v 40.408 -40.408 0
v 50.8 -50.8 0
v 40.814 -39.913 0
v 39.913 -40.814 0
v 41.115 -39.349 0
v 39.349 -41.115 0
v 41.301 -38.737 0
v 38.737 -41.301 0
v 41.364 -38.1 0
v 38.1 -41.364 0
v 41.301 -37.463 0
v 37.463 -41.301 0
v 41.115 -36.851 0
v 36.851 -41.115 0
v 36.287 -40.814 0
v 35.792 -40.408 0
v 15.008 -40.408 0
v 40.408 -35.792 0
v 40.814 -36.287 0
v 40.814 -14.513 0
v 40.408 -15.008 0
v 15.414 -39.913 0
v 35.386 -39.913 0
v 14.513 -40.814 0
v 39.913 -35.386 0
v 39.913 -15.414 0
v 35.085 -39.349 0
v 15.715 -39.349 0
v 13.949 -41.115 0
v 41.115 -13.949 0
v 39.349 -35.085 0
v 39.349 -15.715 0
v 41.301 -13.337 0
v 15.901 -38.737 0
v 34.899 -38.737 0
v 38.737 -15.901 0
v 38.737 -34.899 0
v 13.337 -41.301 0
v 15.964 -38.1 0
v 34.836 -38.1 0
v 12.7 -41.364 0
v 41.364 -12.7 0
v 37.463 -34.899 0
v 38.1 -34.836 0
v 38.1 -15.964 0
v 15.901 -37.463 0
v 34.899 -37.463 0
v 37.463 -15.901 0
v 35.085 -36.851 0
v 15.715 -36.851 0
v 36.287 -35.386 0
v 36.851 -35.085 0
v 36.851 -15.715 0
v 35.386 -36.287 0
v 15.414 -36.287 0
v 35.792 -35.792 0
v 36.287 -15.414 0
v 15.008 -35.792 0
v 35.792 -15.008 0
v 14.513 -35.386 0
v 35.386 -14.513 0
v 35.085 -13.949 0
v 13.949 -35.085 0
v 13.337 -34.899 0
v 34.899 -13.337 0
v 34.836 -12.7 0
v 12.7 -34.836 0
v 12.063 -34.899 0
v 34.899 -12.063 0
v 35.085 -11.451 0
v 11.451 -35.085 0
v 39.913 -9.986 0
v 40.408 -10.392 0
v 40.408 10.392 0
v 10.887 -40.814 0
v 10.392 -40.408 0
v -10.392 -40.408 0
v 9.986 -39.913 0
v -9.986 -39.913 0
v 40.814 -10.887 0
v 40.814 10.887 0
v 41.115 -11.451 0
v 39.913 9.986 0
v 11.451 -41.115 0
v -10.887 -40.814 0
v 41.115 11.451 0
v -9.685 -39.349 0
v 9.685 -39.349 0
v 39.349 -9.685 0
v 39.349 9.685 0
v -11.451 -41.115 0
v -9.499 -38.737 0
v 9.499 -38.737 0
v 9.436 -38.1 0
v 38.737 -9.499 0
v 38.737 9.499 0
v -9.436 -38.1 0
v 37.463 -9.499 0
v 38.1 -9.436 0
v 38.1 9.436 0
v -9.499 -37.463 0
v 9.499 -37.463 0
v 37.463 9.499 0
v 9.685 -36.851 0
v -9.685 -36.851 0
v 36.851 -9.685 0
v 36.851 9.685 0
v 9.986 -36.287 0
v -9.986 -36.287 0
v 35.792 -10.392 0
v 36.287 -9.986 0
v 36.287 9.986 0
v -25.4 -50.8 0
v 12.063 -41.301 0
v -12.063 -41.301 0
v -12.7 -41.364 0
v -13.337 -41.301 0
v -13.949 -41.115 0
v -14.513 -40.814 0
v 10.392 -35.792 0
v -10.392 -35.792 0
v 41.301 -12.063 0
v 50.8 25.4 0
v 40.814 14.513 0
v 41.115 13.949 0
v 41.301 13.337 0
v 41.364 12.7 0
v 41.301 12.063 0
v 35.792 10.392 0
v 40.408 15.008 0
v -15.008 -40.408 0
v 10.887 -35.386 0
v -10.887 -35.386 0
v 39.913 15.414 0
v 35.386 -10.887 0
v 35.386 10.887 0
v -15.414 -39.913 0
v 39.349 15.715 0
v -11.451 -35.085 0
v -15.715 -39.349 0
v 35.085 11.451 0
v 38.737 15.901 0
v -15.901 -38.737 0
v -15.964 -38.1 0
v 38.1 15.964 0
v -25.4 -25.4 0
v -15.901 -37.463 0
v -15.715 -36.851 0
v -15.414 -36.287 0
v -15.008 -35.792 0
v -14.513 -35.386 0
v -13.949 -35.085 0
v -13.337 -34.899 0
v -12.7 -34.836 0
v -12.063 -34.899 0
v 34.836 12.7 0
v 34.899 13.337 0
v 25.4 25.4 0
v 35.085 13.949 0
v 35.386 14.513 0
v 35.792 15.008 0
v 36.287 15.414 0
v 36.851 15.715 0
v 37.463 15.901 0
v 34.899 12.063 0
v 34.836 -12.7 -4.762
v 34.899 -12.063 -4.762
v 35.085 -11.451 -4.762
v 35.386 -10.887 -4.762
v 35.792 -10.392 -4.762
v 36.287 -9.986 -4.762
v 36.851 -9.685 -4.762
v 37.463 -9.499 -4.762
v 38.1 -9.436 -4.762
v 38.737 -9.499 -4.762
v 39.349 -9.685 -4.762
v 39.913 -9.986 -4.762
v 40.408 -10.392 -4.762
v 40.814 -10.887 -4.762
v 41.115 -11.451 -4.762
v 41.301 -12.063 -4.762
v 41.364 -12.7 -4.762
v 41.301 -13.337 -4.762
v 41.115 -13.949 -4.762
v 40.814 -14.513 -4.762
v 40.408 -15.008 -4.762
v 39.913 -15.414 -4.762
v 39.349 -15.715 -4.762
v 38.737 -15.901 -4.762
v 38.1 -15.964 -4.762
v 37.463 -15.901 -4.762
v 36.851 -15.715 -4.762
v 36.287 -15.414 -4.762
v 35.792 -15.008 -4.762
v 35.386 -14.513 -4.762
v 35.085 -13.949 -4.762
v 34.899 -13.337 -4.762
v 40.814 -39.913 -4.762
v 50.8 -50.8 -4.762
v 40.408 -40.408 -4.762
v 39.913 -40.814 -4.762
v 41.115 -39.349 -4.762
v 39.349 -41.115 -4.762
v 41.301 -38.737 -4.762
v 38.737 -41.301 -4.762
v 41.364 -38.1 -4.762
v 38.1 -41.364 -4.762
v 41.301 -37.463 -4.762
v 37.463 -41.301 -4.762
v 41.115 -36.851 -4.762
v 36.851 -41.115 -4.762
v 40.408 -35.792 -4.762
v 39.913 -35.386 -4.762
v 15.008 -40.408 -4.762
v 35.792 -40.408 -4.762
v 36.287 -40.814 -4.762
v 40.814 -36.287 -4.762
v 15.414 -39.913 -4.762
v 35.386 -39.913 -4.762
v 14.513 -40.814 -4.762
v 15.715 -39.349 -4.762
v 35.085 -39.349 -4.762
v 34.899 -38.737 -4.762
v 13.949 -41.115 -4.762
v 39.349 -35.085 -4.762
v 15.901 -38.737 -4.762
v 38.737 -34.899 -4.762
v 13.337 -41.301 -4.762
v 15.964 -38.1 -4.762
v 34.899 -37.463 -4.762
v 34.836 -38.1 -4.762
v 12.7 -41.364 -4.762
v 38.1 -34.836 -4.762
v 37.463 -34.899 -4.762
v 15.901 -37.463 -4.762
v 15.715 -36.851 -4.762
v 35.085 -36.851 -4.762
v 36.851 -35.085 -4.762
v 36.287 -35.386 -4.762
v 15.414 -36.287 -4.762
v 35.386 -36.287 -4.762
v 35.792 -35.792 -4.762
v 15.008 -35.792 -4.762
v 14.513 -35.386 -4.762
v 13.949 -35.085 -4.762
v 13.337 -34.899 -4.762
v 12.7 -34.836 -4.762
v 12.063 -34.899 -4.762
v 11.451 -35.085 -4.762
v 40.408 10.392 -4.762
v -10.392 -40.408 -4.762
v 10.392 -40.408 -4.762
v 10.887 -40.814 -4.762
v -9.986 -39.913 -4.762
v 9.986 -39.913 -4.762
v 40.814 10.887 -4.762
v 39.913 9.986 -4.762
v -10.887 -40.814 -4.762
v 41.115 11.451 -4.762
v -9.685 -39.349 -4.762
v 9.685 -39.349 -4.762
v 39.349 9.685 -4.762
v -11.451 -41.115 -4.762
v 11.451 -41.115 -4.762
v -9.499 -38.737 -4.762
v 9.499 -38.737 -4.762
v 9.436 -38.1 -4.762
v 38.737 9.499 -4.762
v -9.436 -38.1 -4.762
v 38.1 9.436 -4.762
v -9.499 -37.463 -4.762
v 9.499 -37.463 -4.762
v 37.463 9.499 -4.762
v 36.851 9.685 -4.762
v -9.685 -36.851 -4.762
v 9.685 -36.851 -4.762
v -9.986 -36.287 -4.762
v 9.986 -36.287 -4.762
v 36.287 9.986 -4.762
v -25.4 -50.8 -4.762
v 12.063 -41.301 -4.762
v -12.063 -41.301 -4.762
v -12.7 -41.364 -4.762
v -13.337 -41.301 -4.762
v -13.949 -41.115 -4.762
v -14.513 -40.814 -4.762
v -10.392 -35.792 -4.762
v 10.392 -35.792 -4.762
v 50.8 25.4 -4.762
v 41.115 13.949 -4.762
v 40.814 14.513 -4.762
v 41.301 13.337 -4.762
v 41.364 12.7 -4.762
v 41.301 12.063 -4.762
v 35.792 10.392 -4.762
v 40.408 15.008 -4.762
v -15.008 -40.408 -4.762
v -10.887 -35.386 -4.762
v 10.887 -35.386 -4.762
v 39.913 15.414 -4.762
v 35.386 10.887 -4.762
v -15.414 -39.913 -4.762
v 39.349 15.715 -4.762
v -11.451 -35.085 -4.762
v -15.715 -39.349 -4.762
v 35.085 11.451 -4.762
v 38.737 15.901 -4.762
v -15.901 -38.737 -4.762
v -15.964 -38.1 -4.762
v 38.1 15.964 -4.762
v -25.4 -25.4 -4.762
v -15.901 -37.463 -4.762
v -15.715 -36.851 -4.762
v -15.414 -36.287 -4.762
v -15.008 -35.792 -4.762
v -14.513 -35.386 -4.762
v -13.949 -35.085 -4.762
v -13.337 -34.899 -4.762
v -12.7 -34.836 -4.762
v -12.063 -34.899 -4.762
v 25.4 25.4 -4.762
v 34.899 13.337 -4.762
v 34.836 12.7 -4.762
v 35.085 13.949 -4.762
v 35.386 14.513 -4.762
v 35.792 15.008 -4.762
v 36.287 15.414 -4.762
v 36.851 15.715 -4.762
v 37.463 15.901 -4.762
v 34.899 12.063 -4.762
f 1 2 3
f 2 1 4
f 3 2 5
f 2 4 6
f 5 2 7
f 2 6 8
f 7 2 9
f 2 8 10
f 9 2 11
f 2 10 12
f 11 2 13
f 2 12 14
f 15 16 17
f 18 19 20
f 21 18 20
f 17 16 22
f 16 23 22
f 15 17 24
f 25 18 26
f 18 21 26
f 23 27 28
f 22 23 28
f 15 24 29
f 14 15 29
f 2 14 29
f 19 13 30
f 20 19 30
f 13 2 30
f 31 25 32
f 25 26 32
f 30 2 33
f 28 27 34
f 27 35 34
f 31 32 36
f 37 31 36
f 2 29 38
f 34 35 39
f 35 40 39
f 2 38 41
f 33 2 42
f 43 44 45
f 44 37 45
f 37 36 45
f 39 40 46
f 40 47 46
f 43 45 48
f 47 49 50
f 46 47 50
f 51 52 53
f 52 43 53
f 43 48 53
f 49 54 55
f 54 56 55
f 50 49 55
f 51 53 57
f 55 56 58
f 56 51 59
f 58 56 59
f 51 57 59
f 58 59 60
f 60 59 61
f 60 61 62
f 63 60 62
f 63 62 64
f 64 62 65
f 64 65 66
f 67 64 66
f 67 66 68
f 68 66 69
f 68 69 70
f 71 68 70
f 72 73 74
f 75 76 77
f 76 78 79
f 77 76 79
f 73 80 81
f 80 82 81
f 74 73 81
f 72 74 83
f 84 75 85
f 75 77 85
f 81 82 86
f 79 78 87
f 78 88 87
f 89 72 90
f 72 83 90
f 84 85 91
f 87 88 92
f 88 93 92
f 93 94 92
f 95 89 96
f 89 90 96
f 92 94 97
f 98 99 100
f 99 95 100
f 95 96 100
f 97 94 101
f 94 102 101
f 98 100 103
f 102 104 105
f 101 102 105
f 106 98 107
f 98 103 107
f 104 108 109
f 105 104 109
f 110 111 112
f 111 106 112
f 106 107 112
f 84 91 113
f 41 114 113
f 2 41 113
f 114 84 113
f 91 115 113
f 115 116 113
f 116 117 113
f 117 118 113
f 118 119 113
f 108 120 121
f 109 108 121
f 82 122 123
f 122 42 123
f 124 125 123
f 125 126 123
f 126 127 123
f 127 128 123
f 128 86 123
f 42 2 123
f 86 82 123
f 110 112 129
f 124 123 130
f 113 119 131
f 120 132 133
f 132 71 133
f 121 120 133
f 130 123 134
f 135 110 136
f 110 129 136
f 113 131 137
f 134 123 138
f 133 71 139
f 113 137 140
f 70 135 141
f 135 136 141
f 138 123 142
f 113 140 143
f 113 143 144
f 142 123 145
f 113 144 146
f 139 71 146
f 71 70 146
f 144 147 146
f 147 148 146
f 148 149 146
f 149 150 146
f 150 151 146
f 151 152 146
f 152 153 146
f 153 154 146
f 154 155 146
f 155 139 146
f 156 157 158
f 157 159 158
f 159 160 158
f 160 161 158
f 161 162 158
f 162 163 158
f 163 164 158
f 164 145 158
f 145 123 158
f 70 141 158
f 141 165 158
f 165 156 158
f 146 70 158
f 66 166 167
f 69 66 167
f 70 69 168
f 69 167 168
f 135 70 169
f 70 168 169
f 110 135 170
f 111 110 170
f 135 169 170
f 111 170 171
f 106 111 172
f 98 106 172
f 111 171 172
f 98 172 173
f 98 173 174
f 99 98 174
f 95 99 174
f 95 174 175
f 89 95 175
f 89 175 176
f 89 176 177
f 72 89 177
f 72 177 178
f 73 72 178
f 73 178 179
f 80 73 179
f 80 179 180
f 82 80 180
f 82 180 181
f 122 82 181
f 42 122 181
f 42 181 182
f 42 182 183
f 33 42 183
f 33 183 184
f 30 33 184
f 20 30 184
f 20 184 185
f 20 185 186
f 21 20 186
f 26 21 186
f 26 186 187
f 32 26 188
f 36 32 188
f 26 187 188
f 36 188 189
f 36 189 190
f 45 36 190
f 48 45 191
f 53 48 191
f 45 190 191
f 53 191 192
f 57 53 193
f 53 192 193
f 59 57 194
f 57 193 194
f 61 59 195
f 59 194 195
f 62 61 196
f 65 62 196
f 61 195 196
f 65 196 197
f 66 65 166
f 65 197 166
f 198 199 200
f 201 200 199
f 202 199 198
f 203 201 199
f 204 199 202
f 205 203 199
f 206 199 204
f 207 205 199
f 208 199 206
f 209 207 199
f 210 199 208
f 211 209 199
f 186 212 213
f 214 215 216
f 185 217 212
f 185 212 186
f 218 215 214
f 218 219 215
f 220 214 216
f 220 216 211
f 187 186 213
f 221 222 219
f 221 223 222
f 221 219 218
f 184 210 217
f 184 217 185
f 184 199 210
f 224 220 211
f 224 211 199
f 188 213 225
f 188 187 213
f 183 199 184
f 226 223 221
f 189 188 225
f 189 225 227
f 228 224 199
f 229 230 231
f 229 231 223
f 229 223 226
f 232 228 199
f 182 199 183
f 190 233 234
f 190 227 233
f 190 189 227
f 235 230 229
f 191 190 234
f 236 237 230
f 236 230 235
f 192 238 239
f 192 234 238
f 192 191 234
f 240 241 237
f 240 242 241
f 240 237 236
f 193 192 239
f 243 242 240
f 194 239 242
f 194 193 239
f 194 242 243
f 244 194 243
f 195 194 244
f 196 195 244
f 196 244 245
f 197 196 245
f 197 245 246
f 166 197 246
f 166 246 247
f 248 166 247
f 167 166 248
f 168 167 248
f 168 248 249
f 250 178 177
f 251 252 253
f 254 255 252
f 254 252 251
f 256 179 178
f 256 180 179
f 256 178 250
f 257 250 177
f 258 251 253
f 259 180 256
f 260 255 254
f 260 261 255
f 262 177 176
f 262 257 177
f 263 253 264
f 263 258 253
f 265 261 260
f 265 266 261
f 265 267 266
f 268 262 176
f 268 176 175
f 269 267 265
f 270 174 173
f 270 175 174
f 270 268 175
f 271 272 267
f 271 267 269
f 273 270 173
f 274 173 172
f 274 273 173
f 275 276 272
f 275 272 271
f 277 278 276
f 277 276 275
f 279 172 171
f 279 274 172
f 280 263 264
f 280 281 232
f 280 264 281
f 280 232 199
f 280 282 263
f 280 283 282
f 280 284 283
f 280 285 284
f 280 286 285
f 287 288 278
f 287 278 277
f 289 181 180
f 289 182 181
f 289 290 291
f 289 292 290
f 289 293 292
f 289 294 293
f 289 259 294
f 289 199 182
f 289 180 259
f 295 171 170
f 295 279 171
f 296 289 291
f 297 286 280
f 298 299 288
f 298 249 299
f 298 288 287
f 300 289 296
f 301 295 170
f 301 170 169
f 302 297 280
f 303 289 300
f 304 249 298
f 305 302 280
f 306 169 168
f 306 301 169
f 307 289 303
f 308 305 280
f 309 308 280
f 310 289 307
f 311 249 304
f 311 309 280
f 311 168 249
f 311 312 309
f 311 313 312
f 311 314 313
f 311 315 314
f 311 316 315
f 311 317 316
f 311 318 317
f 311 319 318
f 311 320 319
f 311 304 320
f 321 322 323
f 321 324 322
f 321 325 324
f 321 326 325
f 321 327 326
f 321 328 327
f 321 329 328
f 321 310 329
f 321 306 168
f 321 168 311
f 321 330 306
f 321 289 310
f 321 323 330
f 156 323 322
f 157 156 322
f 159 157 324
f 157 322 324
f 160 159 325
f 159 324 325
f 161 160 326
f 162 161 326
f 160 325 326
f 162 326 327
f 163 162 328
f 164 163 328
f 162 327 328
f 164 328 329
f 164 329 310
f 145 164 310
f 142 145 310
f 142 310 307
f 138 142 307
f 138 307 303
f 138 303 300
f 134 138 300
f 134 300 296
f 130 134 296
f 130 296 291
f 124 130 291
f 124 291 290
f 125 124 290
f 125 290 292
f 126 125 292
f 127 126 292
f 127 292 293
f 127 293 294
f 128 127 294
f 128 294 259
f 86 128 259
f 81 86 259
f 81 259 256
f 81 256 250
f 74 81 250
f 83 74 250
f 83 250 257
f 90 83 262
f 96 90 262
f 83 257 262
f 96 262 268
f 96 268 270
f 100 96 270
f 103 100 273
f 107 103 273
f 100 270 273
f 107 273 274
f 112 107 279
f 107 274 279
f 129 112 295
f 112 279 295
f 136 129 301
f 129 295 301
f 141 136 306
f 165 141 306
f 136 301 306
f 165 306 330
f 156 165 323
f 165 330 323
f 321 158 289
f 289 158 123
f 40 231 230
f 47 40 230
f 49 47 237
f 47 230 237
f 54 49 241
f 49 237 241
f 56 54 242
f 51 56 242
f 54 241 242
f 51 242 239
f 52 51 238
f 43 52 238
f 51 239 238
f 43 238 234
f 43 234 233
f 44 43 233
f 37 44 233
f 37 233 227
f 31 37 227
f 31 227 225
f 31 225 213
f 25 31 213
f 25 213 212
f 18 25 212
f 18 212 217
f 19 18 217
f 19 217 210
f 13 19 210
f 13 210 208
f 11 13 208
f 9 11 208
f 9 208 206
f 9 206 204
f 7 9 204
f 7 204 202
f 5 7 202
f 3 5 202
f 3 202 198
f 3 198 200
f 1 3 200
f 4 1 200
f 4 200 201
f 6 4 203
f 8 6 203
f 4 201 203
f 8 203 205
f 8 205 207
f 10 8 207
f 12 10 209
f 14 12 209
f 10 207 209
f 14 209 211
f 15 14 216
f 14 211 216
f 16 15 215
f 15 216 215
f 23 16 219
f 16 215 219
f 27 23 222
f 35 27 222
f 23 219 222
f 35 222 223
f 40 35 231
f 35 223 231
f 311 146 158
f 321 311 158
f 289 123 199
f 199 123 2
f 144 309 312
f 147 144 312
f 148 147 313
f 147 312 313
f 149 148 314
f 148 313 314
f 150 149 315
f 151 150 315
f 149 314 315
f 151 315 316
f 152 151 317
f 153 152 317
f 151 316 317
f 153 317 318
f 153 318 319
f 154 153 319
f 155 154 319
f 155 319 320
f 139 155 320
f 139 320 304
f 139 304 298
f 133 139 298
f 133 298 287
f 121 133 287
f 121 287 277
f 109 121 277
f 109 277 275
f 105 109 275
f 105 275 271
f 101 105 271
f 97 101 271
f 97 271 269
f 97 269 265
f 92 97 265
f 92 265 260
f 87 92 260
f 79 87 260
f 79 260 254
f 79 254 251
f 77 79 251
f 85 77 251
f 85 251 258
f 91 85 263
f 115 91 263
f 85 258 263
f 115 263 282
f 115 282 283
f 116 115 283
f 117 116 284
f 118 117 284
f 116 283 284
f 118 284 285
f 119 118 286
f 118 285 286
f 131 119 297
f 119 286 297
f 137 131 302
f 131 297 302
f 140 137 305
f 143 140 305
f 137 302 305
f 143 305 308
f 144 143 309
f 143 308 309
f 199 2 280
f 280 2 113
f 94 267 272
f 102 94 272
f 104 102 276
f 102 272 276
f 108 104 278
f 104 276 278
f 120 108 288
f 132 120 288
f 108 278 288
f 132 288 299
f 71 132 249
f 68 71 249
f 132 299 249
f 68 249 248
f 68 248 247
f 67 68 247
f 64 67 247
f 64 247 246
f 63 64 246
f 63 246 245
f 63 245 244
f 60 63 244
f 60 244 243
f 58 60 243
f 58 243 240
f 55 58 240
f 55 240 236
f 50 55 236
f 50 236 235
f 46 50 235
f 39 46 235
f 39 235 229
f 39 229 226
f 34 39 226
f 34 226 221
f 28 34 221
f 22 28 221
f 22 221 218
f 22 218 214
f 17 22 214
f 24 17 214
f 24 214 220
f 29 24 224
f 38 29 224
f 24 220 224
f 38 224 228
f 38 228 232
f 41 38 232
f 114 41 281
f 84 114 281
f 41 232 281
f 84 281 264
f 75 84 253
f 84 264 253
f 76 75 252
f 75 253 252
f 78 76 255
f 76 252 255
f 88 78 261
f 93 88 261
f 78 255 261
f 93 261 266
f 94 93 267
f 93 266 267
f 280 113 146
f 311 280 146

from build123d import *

# Parameters (mm, degrees)
EXTRUDE1_DEPTH  = 4.7625
SKETCH2_R       = 3.2639
SINGLE_90_DEPTH = 5.7625


with BuildPart() as part:
    # Sketch1 → Extrude1 (new body)
    with BuildSketch(Plane.XY):
        Polygon((25.4, 25.4), (50.8, 25.4), (50.8, -50.8), (-25.4, -50.8), (-25.4, -25.4), align=None)
    extrude(amount=-EXTRUDE1_DEPTH)

    # Sketch2 → single 90 (cut, through all)
    with BuildSketch(Plane(origin=(0, 0, -4.7625), x_dir=(-1, 0, 0), z_dir=(0, 0, -1))):
        with Locations((-38.1, -38.1)):
            Circle(SKETCH2_R)
        with Locations((-12.7, -38.1)):
            Circle(SKETCH2_R)
        with Locations((12.7, -38.1)):
            Circle(SKETCH2_R)
        with Locations((-38.1, -12.7)):
            Circle(SKETCH2_R)
        with Locations((-38.1, 12.7)):
            Circle(SKETCH2_R)
    extrude(amount=-SINGLE_90_DEPTH, mode=Mode.SUBTRACT)


solid = part.part
